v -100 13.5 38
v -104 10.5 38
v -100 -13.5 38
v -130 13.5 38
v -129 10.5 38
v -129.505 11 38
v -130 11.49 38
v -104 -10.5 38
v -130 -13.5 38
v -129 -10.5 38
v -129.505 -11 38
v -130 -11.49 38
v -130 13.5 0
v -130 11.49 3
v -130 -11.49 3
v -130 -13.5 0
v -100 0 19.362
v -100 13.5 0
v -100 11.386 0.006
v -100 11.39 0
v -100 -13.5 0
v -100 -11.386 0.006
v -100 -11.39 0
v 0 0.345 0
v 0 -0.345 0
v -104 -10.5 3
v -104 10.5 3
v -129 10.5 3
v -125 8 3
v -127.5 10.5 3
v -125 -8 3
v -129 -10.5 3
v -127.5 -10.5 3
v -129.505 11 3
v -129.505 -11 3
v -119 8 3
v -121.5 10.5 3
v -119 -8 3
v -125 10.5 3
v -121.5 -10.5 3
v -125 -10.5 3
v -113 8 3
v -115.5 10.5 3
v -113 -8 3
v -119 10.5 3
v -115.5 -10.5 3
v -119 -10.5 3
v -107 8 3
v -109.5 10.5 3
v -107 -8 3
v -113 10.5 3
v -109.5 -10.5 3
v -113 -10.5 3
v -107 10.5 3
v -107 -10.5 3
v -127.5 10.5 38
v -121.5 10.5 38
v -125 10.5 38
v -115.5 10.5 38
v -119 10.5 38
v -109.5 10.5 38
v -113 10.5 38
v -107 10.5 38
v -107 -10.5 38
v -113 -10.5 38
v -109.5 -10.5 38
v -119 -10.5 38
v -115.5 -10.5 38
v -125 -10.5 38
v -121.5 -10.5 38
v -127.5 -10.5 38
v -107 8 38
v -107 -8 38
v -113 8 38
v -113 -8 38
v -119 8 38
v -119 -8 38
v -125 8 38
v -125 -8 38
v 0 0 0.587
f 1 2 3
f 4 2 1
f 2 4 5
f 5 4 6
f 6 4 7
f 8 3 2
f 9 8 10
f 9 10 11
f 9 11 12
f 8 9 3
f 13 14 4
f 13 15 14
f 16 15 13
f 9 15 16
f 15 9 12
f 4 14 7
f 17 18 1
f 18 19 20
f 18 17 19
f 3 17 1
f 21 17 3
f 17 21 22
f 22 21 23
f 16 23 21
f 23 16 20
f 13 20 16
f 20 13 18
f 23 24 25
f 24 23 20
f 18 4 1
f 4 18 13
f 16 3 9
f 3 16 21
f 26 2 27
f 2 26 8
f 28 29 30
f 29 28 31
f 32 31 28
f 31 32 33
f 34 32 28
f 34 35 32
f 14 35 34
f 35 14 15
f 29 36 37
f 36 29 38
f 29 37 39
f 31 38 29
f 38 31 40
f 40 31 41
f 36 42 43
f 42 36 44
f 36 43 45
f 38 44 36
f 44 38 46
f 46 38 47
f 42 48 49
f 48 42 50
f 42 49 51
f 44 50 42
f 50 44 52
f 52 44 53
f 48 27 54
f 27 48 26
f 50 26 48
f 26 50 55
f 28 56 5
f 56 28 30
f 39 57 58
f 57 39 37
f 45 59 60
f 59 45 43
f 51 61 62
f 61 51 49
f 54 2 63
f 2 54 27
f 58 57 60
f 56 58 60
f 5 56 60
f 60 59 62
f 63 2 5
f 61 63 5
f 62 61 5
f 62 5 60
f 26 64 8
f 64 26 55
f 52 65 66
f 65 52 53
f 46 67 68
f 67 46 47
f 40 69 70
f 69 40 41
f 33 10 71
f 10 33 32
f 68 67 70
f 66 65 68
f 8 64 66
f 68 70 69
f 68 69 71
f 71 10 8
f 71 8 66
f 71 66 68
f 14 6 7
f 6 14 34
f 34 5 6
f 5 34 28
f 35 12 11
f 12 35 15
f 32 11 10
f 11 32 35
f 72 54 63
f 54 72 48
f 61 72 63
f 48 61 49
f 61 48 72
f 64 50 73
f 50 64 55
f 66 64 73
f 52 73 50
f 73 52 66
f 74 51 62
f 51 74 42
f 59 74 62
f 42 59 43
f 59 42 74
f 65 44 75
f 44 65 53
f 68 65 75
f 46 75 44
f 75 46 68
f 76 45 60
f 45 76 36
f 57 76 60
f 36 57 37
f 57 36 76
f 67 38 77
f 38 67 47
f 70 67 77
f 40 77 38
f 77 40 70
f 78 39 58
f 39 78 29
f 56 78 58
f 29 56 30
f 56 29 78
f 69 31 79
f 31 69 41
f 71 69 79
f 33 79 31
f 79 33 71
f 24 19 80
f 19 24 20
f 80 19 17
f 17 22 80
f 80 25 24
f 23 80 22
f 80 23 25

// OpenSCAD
// Gravestone stake - ground stake with a C-channel that grips a 20mm foam gravestone.
//
// Use orientation: tip at z=0, C-channel mouth open at z=total_h facing UP,
// gravestone slides down into the channel from the top.
//
// Printing (FR-5), set with print_mode:
//   "flat"    - lies on the flat face of the triangular stake, which is the same
//               plane as the outside of the channel's back wall (FR-4). That
//               wall then lies flat on the bed and the cavity opens straight
//               up: the side walls stand up off it, the grip ridges run up them
//               as vertical ribs, and nothing bridges or overhangs at all.
//   "upright" - channel mouth on the bed, stake pointing up. Also support-free,
//               but it is a 130mm tower on a thin U of bed contact.
//   "none"    - as used, for looking at it.
//
// Set show_stake = false to print the C-channel on its own as a fit test.

$fa = 2;
$fs = 0.25;

/* ---------- parameters ---------- */

total_h       = 130;  // DR-1 overall height
channel_h     = 30;   // DR-3 C-channel section (floor + walls) (cm)
foam_t        = 20;   // DR-2 foam gravestone thickness (mm)
foam_gap      = 1;    // FR-3 slip fit on the foam
channel_depth = 35;   // how far the gravestone sits into the channel (X)
wall_t        = 3;    // back / left / right wall thickness
floor_t       = 4;    // channel floor - the stake stops here (AR-3)
lead_in       = 1.0;  // chamfer at the mouth to guide the foam in (also thins
                      // the wall at the bed, so keep it well under wall_t)

ridge_p       = 2.5;    // (mm) FR-2 how far the grip ridges bite into the foam
ridge_pitch   = 6;    // vertical spacing of the ridges
ridge_inset   = 3;    // first ridge above the channel floor

stake_tip     = 0.03; // taper left at the tip, as a fraction of the base
stake_overlap = 1;    // AR-4 how far the stake buries into the floor

show_stake    = true;    // false = C-channel only, for a quick fit-test print
print_mode    = "flat";  // "flat" | "upright" | "none" - see the header
show_gravestone = false;  // AR-3/DR-2 check: translucent 200 x 400 x 20 reference panel

/* ---------- derived ---------- */

slot     = foam_t + foam_gap;        // 21mm cavity between the side walls
outer_x  = channel_depth + wall_t;   // back wall + cavity, front is open
outer_y  = slot + 2 * wall_t;
stake_h  = total_h - channel_h;      // 90mm below the channel
cav_x0   = -outer_x / 2 + wall_t;    // inner face of the back wall
cav_len  = channel_depth + 1;        // cavity cut, runs out through the open front
ridge_len = channel_depth + 0.01;    // ridges stop flush with the open front

// FR-4 stake cross section: an isoceles triangle sitting inside the channel
// footprint, its base edge in the plane of the back wall's outer face.
stake_base_w = outer_y - 4;           // base edge, across the channel (Y)
stake_base_d = stake_base_w * 0.85;   // out towards the apex (X), near equilateral

/* ---------- parts ---------- */

// One horizontal grip ridge running along X (the depth of the channel).
// Profile: flat underside so the foam catches on pull-out, 45 deg top face so
// it slides down in easily - and so the face prints without support once the
// model is flipped.
module grip_ridge(len, p)
{
	rotate([90, 0, 90])
		linear_extrude(height = len)
			polygon([[0, 0], [p, 0], [p, p]]);
}

// FR-1 / OR-1 / OR-2: back + left + right walls, open at the front and at the top.
module channel()
{
	difference()
	{
		union()
		{
			translate([-outer_x / 2, -outer_y / 2, 0])
				cube([outer_x, outer_y, channel_h]);
		}

		// cavity - open through the front face and out the top
		translate([cav_x0, -slot / 2, floor_t])
			cube([cav_len, slot, channel_h - floor_t + 1]);

		// flared lead-in at the mouth
		translate([0, 0, channel_h - lead_in])
			linear_extrude(height = lead_in + 0.01, scale = [1, (slot + 2 * lead_in) / slot])
				translate([cav_x0 + cav_len / 2, 0])
					square([cav_len, slot], center = true);
	}

	// FR-2: ridges on both inner side walls
	for (z = [floor_t + ridge_inset : ridge_pitch : channel_h - lead_in - ridge_p - 0.5])
	{
		for (side = [1, -1])
		{
			scale([1, side, 1])
				translate([cav_x0 - 0.01, slot / 2 - ridge_p, z])
					grip_ridge(ridge_len, ridge_p);
		}
	}
}

// FR-4: triangular stake, tapered the whole way and pointed at the bottom.
// The extrusion scales towards the midpoint of the base edge, so that whole
// face stays in the plane x = -outer_x/2 - the back of the channel, the closed
// side - and the two make one flat surface to print on. Printed on that face
// no outside wall of the channel ends up overhanging.
//
// AR-2 / AR-4: the top of the taper sits stake_overlap deep in the channel
// floor, so the solids intersect instead of just touching. floor_t is thicker
// than stake_overlap, so nothing reaches the cavity (AR-3).
module stake()
{
	translate([-outer_x / 2, 0, stake_h + stake_overlap])
		mirror([0, 0, 1])
			linear_extrude(height = stake_h + stake_overlap, scale = stake_tip)
				polygon([[0, -stake_base_w / 2],
				         [0,  stake_base_w / 2],
				         [stake_base_d, 0]]);
}

// AR-1: channel centered on the stake axis. AR-3: the stake stops at the
// channel floor, so the cavity above it is empty.
module gravestone_stake()
{
	if (show_stake)
		stake();

	translate([0, 0, stake_h])
		channel();
}

// Reference only: a 200 x 400 x 20 foam gravestone seated on the channel floor.
// Its thickness sits in the slot, its width runs out through the open front.
module gravestone_ref()
{
	translate([cav_x0, -foam_t / 2, stake_h + floor_t])
		cube([200, foam_t, 400]);
}

// show_gravestone is a visual check, so it always uses the as-used orientation.
if (show_gravestone)
{
	gravestone_stake();
	%gravestone_ref();
}
else if (print_mode == "flat")
{
	// roll the FR-4 flat face down onto the bed
	translate([0, 0, outer_x / 2])
		rotate([0, -90, 0])
			gravestone_stake();
}
else if (print_mode == "upright")
{
	translate([0, 0, total_h])
		rotate([180, 0, 0])
			gravestone_stake();
}
else
{
	gravestone_stake();
}
